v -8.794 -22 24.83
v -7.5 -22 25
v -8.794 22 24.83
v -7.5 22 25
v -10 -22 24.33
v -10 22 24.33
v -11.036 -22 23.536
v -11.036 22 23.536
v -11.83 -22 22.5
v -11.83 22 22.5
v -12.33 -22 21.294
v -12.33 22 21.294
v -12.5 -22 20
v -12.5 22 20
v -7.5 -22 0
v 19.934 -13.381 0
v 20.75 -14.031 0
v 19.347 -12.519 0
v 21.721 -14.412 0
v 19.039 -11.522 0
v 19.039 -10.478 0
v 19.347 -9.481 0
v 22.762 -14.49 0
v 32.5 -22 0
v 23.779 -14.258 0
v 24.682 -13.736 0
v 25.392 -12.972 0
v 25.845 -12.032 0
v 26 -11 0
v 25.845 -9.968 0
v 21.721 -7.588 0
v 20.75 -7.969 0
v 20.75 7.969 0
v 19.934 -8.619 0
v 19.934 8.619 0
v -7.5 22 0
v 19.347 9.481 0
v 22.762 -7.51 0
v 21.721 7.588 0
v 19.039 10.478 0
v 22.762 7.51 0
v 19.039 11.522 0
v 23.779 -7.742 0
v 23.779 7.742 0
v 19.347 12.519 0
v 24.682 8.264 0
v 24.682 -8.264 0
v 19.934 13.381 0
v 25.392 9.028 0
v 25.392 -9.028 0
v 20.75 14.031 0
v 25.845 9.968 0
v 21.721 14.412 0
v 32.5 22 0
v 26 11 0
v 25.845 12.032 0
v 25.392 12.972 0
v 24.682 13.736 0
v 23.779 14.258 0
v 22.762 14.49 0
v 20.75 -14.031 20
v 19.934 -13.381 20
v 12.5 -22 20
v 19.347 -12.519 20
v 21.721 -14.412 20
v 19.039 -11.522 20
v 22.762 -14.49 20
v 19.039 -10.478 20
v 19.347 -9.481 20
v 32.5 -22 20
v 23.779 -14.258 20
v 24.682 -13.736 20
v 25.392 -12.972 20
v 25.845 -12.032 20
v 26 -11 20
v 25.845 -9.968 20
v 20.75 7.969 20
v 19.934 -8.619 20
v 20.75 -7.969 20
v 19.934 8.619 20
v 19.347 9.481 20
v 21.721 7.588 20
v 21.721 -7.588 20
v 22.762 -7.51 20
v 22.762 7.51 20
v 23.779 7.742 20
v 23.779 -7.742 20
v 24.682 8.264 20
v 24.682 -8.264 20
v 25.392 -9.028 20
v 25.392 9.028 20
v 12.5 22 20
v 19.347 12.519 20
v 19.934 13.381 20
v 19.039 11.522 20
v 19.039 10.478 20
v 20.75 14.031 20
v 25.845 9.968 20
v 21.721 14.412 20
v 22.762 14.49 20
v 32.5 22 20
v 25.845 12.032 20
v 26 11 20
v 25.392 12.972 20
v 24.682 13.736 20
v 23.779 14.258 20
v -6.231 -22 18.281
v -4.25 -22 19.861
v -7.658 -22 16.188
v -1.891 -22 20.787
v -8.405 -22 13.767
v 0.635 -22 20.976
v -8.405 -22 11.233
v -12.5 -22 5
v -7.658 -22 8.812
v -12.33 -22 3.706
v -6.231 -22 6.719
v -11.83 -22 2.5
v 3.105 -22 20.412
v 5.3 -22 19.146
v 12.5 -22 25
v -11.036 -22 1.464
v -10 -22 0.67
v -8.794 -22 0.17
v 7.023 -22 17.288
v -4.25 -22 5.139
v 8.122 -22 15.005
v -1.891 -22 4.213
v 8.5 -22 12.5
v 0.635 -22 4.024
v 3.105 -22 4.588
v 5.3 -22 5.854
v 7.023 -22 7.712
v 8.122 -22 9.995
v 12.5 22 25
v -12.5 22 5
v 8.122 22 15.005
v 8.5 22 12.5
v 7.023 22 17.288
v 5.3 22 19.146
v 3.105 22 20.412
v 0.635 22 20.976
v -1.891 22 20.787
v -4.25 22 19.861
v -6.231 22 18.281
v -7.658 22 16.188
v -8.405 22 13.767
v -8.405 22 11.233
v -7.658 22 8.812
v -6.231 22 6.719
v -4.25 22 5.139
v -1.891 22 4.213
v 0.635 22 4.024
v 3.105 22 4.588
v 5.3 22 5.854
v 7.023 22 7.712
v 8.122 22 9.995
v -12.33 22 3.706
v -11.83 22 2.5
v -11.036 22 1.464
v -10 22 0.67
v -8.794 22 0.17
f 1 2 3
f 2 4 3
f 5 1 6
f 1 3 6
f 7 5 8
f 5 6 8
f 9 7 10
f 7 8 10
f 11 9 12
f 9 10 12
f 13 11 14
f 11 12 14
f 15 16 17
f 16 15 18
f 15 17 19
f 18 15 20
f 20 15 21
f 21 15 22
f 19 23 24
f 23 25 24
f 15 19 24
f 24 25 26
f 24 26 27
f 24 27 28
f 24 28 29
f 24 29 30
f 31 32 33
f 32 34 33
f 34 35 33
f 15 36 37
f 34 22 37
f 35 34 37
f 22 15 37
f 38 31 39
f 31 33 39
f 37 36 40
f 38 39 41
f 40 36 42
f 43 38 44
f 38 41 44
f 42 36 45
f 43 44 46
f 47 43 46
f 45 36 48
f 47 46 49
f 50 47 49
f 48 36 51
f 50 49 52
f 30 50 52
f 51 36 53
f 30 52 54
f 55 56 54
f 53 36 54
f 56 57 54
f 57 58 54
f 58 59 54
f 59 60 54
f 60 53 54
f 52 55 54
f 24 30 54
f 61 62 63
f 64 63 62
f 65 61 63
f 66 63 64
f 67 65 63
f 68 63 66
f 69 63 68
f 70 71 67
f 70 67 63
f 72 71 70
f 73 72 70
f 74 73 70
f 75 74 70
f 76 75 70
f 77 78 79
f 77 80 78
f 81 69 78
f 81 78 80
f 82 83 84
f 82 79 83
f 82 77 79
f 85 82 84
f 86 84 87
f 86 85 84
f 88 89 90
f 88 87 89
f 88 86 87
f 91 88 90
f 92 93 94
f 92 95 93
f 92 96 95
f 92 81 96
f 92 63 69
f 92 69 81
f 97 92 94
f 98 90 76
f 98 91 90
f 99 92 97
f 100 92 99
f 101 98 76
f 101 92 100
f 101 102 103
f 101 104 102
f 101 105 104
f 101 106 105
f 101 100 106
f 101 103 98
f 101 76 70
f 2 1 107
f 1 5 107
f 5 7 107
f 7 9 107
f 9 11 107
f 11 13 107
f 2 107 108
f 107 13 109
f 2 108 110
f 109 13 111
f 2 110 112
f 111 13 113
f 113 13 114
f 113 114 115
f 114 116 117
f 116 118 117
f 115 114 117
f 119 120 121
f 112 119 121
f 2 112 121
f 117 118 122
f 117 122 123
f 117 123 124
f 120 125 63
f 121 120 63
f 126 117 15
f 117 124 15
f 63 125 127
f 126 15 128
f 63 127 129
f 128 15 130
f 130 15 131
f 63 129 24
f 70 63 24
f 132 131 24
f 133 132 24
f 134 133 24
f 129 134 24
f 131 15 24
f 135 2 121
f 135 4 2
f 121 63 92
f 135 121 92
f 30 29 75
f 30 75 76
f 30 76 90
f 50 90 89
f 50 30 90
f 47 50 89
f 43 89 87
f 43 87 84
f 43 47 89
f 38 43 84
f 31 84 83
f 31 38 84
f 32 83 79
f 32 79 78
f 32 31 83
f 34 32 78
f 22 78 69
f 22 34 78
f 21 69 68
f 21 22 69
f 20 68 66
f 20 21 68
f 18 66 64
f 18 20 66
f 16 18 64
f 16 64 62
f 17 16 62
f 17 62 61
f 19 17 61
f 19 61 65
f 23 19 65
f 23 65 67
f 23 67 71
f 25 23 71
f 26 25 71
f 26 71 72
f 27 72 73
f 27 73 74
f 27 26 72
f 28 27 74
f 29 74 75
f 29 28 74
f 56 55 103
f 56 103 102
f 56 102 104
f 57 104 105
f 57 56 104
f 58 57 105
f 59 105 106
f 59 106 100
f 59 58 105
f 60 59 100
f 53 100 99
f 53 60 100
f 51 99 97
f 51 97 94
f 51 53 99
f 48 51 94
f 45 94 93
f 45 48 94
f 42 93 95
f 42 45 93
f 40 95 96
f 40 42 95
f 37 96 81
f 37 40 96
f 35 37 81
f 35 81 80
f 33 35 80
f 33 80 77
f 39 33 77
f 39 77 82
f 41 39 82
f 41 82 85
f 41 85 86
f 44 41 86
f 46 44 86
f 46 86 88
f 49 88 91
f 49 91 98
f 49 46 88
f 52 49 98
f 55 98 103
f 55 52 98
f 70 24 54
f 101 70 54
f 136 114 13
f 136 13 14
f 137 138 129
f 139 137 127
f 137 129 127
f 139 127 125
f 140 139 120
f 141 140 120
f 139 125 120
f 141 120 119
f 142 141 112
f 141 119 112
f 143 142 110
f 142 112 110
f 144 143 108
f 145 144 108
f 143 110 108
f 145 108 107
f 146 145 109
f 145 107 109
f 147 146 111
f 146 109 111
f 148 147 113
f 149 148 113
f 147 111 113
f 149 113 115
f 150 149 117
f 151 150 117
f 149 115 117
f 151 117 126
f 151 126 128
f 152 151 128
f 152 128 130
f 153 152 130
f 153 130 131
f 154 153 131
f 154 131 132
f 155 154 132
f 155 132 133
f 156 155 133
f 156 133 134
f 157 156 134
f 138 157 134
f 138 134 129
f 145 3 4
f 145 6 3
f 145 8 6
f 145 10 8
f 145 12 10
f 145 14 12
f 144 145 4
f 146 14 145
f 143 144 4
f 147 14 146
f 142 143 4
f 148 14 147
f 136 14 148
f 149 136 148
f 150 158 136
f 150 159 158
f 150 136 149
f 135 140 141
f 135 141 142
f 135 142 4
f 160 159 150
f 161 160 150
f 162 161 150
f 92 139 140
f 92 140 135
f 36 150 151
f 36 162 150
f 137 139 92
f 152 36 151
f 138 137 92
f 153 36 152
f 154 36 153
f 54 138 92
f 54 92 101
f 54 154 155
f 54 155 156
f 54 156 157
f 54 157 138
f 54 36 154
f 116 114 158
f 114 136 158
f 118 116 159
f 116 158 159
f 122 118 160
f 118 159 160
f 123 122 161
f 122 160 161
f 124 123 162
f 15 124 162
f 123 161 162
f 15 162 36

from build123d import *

# Parameters (mm, degrees)
F0_W     = 25
F0_H     = 44
F1_DEPTH = 25
F2_R     = 8.5
F3_DEPTH = 44.001
F0_W_2   = 20
F0_R     = 3.5
F4_DEPTH = 20
F5_R     = 5


# Not quite as in the source:
# - a feature names something its author has since deleted; it is built from what else it names


with BuildPart() as f1:
    # F0 (on Top) → F1 (new body)
    with BuildSketch(Plane.XY):
        Rectangle(F0_W, F0_H)
    extrude(amount=F1_DEPTH)

    # F2 (on face) → F3 (cut, through all)
    with BuildSketch(Plane.XZ.offset(22)):
        with Locations((0, 12.5)):
            Circle(F2_R)
    extrude(amount=-F3_DEPTH, mode=Mode.SUBTRACT)

    # F0 (on Top) → F4 (join)
    with BuildSketch(Plane.XY):
        with Locations((22.5, 0)):
            Rectangle(F0_W_2, F0_H)
        with Locations((22.5, -11)):
            Circle(F0_R, mode=Mode.SUBTRACT)
        with Locations((22.5, 11)):
            Circle(F0_R, mode=Mode.SUBTRACT)
    extrude(amount=F4_DEPTH)

    # F5
    f5_edges = [f1.edges().sort_by_distance(p)[0] for p in [
        (-12.5, 0, 25),
        (-12.5, 0, 0),
    ]]
    fillet(f5_edges, radius=F5_R)


solid = f1.part
